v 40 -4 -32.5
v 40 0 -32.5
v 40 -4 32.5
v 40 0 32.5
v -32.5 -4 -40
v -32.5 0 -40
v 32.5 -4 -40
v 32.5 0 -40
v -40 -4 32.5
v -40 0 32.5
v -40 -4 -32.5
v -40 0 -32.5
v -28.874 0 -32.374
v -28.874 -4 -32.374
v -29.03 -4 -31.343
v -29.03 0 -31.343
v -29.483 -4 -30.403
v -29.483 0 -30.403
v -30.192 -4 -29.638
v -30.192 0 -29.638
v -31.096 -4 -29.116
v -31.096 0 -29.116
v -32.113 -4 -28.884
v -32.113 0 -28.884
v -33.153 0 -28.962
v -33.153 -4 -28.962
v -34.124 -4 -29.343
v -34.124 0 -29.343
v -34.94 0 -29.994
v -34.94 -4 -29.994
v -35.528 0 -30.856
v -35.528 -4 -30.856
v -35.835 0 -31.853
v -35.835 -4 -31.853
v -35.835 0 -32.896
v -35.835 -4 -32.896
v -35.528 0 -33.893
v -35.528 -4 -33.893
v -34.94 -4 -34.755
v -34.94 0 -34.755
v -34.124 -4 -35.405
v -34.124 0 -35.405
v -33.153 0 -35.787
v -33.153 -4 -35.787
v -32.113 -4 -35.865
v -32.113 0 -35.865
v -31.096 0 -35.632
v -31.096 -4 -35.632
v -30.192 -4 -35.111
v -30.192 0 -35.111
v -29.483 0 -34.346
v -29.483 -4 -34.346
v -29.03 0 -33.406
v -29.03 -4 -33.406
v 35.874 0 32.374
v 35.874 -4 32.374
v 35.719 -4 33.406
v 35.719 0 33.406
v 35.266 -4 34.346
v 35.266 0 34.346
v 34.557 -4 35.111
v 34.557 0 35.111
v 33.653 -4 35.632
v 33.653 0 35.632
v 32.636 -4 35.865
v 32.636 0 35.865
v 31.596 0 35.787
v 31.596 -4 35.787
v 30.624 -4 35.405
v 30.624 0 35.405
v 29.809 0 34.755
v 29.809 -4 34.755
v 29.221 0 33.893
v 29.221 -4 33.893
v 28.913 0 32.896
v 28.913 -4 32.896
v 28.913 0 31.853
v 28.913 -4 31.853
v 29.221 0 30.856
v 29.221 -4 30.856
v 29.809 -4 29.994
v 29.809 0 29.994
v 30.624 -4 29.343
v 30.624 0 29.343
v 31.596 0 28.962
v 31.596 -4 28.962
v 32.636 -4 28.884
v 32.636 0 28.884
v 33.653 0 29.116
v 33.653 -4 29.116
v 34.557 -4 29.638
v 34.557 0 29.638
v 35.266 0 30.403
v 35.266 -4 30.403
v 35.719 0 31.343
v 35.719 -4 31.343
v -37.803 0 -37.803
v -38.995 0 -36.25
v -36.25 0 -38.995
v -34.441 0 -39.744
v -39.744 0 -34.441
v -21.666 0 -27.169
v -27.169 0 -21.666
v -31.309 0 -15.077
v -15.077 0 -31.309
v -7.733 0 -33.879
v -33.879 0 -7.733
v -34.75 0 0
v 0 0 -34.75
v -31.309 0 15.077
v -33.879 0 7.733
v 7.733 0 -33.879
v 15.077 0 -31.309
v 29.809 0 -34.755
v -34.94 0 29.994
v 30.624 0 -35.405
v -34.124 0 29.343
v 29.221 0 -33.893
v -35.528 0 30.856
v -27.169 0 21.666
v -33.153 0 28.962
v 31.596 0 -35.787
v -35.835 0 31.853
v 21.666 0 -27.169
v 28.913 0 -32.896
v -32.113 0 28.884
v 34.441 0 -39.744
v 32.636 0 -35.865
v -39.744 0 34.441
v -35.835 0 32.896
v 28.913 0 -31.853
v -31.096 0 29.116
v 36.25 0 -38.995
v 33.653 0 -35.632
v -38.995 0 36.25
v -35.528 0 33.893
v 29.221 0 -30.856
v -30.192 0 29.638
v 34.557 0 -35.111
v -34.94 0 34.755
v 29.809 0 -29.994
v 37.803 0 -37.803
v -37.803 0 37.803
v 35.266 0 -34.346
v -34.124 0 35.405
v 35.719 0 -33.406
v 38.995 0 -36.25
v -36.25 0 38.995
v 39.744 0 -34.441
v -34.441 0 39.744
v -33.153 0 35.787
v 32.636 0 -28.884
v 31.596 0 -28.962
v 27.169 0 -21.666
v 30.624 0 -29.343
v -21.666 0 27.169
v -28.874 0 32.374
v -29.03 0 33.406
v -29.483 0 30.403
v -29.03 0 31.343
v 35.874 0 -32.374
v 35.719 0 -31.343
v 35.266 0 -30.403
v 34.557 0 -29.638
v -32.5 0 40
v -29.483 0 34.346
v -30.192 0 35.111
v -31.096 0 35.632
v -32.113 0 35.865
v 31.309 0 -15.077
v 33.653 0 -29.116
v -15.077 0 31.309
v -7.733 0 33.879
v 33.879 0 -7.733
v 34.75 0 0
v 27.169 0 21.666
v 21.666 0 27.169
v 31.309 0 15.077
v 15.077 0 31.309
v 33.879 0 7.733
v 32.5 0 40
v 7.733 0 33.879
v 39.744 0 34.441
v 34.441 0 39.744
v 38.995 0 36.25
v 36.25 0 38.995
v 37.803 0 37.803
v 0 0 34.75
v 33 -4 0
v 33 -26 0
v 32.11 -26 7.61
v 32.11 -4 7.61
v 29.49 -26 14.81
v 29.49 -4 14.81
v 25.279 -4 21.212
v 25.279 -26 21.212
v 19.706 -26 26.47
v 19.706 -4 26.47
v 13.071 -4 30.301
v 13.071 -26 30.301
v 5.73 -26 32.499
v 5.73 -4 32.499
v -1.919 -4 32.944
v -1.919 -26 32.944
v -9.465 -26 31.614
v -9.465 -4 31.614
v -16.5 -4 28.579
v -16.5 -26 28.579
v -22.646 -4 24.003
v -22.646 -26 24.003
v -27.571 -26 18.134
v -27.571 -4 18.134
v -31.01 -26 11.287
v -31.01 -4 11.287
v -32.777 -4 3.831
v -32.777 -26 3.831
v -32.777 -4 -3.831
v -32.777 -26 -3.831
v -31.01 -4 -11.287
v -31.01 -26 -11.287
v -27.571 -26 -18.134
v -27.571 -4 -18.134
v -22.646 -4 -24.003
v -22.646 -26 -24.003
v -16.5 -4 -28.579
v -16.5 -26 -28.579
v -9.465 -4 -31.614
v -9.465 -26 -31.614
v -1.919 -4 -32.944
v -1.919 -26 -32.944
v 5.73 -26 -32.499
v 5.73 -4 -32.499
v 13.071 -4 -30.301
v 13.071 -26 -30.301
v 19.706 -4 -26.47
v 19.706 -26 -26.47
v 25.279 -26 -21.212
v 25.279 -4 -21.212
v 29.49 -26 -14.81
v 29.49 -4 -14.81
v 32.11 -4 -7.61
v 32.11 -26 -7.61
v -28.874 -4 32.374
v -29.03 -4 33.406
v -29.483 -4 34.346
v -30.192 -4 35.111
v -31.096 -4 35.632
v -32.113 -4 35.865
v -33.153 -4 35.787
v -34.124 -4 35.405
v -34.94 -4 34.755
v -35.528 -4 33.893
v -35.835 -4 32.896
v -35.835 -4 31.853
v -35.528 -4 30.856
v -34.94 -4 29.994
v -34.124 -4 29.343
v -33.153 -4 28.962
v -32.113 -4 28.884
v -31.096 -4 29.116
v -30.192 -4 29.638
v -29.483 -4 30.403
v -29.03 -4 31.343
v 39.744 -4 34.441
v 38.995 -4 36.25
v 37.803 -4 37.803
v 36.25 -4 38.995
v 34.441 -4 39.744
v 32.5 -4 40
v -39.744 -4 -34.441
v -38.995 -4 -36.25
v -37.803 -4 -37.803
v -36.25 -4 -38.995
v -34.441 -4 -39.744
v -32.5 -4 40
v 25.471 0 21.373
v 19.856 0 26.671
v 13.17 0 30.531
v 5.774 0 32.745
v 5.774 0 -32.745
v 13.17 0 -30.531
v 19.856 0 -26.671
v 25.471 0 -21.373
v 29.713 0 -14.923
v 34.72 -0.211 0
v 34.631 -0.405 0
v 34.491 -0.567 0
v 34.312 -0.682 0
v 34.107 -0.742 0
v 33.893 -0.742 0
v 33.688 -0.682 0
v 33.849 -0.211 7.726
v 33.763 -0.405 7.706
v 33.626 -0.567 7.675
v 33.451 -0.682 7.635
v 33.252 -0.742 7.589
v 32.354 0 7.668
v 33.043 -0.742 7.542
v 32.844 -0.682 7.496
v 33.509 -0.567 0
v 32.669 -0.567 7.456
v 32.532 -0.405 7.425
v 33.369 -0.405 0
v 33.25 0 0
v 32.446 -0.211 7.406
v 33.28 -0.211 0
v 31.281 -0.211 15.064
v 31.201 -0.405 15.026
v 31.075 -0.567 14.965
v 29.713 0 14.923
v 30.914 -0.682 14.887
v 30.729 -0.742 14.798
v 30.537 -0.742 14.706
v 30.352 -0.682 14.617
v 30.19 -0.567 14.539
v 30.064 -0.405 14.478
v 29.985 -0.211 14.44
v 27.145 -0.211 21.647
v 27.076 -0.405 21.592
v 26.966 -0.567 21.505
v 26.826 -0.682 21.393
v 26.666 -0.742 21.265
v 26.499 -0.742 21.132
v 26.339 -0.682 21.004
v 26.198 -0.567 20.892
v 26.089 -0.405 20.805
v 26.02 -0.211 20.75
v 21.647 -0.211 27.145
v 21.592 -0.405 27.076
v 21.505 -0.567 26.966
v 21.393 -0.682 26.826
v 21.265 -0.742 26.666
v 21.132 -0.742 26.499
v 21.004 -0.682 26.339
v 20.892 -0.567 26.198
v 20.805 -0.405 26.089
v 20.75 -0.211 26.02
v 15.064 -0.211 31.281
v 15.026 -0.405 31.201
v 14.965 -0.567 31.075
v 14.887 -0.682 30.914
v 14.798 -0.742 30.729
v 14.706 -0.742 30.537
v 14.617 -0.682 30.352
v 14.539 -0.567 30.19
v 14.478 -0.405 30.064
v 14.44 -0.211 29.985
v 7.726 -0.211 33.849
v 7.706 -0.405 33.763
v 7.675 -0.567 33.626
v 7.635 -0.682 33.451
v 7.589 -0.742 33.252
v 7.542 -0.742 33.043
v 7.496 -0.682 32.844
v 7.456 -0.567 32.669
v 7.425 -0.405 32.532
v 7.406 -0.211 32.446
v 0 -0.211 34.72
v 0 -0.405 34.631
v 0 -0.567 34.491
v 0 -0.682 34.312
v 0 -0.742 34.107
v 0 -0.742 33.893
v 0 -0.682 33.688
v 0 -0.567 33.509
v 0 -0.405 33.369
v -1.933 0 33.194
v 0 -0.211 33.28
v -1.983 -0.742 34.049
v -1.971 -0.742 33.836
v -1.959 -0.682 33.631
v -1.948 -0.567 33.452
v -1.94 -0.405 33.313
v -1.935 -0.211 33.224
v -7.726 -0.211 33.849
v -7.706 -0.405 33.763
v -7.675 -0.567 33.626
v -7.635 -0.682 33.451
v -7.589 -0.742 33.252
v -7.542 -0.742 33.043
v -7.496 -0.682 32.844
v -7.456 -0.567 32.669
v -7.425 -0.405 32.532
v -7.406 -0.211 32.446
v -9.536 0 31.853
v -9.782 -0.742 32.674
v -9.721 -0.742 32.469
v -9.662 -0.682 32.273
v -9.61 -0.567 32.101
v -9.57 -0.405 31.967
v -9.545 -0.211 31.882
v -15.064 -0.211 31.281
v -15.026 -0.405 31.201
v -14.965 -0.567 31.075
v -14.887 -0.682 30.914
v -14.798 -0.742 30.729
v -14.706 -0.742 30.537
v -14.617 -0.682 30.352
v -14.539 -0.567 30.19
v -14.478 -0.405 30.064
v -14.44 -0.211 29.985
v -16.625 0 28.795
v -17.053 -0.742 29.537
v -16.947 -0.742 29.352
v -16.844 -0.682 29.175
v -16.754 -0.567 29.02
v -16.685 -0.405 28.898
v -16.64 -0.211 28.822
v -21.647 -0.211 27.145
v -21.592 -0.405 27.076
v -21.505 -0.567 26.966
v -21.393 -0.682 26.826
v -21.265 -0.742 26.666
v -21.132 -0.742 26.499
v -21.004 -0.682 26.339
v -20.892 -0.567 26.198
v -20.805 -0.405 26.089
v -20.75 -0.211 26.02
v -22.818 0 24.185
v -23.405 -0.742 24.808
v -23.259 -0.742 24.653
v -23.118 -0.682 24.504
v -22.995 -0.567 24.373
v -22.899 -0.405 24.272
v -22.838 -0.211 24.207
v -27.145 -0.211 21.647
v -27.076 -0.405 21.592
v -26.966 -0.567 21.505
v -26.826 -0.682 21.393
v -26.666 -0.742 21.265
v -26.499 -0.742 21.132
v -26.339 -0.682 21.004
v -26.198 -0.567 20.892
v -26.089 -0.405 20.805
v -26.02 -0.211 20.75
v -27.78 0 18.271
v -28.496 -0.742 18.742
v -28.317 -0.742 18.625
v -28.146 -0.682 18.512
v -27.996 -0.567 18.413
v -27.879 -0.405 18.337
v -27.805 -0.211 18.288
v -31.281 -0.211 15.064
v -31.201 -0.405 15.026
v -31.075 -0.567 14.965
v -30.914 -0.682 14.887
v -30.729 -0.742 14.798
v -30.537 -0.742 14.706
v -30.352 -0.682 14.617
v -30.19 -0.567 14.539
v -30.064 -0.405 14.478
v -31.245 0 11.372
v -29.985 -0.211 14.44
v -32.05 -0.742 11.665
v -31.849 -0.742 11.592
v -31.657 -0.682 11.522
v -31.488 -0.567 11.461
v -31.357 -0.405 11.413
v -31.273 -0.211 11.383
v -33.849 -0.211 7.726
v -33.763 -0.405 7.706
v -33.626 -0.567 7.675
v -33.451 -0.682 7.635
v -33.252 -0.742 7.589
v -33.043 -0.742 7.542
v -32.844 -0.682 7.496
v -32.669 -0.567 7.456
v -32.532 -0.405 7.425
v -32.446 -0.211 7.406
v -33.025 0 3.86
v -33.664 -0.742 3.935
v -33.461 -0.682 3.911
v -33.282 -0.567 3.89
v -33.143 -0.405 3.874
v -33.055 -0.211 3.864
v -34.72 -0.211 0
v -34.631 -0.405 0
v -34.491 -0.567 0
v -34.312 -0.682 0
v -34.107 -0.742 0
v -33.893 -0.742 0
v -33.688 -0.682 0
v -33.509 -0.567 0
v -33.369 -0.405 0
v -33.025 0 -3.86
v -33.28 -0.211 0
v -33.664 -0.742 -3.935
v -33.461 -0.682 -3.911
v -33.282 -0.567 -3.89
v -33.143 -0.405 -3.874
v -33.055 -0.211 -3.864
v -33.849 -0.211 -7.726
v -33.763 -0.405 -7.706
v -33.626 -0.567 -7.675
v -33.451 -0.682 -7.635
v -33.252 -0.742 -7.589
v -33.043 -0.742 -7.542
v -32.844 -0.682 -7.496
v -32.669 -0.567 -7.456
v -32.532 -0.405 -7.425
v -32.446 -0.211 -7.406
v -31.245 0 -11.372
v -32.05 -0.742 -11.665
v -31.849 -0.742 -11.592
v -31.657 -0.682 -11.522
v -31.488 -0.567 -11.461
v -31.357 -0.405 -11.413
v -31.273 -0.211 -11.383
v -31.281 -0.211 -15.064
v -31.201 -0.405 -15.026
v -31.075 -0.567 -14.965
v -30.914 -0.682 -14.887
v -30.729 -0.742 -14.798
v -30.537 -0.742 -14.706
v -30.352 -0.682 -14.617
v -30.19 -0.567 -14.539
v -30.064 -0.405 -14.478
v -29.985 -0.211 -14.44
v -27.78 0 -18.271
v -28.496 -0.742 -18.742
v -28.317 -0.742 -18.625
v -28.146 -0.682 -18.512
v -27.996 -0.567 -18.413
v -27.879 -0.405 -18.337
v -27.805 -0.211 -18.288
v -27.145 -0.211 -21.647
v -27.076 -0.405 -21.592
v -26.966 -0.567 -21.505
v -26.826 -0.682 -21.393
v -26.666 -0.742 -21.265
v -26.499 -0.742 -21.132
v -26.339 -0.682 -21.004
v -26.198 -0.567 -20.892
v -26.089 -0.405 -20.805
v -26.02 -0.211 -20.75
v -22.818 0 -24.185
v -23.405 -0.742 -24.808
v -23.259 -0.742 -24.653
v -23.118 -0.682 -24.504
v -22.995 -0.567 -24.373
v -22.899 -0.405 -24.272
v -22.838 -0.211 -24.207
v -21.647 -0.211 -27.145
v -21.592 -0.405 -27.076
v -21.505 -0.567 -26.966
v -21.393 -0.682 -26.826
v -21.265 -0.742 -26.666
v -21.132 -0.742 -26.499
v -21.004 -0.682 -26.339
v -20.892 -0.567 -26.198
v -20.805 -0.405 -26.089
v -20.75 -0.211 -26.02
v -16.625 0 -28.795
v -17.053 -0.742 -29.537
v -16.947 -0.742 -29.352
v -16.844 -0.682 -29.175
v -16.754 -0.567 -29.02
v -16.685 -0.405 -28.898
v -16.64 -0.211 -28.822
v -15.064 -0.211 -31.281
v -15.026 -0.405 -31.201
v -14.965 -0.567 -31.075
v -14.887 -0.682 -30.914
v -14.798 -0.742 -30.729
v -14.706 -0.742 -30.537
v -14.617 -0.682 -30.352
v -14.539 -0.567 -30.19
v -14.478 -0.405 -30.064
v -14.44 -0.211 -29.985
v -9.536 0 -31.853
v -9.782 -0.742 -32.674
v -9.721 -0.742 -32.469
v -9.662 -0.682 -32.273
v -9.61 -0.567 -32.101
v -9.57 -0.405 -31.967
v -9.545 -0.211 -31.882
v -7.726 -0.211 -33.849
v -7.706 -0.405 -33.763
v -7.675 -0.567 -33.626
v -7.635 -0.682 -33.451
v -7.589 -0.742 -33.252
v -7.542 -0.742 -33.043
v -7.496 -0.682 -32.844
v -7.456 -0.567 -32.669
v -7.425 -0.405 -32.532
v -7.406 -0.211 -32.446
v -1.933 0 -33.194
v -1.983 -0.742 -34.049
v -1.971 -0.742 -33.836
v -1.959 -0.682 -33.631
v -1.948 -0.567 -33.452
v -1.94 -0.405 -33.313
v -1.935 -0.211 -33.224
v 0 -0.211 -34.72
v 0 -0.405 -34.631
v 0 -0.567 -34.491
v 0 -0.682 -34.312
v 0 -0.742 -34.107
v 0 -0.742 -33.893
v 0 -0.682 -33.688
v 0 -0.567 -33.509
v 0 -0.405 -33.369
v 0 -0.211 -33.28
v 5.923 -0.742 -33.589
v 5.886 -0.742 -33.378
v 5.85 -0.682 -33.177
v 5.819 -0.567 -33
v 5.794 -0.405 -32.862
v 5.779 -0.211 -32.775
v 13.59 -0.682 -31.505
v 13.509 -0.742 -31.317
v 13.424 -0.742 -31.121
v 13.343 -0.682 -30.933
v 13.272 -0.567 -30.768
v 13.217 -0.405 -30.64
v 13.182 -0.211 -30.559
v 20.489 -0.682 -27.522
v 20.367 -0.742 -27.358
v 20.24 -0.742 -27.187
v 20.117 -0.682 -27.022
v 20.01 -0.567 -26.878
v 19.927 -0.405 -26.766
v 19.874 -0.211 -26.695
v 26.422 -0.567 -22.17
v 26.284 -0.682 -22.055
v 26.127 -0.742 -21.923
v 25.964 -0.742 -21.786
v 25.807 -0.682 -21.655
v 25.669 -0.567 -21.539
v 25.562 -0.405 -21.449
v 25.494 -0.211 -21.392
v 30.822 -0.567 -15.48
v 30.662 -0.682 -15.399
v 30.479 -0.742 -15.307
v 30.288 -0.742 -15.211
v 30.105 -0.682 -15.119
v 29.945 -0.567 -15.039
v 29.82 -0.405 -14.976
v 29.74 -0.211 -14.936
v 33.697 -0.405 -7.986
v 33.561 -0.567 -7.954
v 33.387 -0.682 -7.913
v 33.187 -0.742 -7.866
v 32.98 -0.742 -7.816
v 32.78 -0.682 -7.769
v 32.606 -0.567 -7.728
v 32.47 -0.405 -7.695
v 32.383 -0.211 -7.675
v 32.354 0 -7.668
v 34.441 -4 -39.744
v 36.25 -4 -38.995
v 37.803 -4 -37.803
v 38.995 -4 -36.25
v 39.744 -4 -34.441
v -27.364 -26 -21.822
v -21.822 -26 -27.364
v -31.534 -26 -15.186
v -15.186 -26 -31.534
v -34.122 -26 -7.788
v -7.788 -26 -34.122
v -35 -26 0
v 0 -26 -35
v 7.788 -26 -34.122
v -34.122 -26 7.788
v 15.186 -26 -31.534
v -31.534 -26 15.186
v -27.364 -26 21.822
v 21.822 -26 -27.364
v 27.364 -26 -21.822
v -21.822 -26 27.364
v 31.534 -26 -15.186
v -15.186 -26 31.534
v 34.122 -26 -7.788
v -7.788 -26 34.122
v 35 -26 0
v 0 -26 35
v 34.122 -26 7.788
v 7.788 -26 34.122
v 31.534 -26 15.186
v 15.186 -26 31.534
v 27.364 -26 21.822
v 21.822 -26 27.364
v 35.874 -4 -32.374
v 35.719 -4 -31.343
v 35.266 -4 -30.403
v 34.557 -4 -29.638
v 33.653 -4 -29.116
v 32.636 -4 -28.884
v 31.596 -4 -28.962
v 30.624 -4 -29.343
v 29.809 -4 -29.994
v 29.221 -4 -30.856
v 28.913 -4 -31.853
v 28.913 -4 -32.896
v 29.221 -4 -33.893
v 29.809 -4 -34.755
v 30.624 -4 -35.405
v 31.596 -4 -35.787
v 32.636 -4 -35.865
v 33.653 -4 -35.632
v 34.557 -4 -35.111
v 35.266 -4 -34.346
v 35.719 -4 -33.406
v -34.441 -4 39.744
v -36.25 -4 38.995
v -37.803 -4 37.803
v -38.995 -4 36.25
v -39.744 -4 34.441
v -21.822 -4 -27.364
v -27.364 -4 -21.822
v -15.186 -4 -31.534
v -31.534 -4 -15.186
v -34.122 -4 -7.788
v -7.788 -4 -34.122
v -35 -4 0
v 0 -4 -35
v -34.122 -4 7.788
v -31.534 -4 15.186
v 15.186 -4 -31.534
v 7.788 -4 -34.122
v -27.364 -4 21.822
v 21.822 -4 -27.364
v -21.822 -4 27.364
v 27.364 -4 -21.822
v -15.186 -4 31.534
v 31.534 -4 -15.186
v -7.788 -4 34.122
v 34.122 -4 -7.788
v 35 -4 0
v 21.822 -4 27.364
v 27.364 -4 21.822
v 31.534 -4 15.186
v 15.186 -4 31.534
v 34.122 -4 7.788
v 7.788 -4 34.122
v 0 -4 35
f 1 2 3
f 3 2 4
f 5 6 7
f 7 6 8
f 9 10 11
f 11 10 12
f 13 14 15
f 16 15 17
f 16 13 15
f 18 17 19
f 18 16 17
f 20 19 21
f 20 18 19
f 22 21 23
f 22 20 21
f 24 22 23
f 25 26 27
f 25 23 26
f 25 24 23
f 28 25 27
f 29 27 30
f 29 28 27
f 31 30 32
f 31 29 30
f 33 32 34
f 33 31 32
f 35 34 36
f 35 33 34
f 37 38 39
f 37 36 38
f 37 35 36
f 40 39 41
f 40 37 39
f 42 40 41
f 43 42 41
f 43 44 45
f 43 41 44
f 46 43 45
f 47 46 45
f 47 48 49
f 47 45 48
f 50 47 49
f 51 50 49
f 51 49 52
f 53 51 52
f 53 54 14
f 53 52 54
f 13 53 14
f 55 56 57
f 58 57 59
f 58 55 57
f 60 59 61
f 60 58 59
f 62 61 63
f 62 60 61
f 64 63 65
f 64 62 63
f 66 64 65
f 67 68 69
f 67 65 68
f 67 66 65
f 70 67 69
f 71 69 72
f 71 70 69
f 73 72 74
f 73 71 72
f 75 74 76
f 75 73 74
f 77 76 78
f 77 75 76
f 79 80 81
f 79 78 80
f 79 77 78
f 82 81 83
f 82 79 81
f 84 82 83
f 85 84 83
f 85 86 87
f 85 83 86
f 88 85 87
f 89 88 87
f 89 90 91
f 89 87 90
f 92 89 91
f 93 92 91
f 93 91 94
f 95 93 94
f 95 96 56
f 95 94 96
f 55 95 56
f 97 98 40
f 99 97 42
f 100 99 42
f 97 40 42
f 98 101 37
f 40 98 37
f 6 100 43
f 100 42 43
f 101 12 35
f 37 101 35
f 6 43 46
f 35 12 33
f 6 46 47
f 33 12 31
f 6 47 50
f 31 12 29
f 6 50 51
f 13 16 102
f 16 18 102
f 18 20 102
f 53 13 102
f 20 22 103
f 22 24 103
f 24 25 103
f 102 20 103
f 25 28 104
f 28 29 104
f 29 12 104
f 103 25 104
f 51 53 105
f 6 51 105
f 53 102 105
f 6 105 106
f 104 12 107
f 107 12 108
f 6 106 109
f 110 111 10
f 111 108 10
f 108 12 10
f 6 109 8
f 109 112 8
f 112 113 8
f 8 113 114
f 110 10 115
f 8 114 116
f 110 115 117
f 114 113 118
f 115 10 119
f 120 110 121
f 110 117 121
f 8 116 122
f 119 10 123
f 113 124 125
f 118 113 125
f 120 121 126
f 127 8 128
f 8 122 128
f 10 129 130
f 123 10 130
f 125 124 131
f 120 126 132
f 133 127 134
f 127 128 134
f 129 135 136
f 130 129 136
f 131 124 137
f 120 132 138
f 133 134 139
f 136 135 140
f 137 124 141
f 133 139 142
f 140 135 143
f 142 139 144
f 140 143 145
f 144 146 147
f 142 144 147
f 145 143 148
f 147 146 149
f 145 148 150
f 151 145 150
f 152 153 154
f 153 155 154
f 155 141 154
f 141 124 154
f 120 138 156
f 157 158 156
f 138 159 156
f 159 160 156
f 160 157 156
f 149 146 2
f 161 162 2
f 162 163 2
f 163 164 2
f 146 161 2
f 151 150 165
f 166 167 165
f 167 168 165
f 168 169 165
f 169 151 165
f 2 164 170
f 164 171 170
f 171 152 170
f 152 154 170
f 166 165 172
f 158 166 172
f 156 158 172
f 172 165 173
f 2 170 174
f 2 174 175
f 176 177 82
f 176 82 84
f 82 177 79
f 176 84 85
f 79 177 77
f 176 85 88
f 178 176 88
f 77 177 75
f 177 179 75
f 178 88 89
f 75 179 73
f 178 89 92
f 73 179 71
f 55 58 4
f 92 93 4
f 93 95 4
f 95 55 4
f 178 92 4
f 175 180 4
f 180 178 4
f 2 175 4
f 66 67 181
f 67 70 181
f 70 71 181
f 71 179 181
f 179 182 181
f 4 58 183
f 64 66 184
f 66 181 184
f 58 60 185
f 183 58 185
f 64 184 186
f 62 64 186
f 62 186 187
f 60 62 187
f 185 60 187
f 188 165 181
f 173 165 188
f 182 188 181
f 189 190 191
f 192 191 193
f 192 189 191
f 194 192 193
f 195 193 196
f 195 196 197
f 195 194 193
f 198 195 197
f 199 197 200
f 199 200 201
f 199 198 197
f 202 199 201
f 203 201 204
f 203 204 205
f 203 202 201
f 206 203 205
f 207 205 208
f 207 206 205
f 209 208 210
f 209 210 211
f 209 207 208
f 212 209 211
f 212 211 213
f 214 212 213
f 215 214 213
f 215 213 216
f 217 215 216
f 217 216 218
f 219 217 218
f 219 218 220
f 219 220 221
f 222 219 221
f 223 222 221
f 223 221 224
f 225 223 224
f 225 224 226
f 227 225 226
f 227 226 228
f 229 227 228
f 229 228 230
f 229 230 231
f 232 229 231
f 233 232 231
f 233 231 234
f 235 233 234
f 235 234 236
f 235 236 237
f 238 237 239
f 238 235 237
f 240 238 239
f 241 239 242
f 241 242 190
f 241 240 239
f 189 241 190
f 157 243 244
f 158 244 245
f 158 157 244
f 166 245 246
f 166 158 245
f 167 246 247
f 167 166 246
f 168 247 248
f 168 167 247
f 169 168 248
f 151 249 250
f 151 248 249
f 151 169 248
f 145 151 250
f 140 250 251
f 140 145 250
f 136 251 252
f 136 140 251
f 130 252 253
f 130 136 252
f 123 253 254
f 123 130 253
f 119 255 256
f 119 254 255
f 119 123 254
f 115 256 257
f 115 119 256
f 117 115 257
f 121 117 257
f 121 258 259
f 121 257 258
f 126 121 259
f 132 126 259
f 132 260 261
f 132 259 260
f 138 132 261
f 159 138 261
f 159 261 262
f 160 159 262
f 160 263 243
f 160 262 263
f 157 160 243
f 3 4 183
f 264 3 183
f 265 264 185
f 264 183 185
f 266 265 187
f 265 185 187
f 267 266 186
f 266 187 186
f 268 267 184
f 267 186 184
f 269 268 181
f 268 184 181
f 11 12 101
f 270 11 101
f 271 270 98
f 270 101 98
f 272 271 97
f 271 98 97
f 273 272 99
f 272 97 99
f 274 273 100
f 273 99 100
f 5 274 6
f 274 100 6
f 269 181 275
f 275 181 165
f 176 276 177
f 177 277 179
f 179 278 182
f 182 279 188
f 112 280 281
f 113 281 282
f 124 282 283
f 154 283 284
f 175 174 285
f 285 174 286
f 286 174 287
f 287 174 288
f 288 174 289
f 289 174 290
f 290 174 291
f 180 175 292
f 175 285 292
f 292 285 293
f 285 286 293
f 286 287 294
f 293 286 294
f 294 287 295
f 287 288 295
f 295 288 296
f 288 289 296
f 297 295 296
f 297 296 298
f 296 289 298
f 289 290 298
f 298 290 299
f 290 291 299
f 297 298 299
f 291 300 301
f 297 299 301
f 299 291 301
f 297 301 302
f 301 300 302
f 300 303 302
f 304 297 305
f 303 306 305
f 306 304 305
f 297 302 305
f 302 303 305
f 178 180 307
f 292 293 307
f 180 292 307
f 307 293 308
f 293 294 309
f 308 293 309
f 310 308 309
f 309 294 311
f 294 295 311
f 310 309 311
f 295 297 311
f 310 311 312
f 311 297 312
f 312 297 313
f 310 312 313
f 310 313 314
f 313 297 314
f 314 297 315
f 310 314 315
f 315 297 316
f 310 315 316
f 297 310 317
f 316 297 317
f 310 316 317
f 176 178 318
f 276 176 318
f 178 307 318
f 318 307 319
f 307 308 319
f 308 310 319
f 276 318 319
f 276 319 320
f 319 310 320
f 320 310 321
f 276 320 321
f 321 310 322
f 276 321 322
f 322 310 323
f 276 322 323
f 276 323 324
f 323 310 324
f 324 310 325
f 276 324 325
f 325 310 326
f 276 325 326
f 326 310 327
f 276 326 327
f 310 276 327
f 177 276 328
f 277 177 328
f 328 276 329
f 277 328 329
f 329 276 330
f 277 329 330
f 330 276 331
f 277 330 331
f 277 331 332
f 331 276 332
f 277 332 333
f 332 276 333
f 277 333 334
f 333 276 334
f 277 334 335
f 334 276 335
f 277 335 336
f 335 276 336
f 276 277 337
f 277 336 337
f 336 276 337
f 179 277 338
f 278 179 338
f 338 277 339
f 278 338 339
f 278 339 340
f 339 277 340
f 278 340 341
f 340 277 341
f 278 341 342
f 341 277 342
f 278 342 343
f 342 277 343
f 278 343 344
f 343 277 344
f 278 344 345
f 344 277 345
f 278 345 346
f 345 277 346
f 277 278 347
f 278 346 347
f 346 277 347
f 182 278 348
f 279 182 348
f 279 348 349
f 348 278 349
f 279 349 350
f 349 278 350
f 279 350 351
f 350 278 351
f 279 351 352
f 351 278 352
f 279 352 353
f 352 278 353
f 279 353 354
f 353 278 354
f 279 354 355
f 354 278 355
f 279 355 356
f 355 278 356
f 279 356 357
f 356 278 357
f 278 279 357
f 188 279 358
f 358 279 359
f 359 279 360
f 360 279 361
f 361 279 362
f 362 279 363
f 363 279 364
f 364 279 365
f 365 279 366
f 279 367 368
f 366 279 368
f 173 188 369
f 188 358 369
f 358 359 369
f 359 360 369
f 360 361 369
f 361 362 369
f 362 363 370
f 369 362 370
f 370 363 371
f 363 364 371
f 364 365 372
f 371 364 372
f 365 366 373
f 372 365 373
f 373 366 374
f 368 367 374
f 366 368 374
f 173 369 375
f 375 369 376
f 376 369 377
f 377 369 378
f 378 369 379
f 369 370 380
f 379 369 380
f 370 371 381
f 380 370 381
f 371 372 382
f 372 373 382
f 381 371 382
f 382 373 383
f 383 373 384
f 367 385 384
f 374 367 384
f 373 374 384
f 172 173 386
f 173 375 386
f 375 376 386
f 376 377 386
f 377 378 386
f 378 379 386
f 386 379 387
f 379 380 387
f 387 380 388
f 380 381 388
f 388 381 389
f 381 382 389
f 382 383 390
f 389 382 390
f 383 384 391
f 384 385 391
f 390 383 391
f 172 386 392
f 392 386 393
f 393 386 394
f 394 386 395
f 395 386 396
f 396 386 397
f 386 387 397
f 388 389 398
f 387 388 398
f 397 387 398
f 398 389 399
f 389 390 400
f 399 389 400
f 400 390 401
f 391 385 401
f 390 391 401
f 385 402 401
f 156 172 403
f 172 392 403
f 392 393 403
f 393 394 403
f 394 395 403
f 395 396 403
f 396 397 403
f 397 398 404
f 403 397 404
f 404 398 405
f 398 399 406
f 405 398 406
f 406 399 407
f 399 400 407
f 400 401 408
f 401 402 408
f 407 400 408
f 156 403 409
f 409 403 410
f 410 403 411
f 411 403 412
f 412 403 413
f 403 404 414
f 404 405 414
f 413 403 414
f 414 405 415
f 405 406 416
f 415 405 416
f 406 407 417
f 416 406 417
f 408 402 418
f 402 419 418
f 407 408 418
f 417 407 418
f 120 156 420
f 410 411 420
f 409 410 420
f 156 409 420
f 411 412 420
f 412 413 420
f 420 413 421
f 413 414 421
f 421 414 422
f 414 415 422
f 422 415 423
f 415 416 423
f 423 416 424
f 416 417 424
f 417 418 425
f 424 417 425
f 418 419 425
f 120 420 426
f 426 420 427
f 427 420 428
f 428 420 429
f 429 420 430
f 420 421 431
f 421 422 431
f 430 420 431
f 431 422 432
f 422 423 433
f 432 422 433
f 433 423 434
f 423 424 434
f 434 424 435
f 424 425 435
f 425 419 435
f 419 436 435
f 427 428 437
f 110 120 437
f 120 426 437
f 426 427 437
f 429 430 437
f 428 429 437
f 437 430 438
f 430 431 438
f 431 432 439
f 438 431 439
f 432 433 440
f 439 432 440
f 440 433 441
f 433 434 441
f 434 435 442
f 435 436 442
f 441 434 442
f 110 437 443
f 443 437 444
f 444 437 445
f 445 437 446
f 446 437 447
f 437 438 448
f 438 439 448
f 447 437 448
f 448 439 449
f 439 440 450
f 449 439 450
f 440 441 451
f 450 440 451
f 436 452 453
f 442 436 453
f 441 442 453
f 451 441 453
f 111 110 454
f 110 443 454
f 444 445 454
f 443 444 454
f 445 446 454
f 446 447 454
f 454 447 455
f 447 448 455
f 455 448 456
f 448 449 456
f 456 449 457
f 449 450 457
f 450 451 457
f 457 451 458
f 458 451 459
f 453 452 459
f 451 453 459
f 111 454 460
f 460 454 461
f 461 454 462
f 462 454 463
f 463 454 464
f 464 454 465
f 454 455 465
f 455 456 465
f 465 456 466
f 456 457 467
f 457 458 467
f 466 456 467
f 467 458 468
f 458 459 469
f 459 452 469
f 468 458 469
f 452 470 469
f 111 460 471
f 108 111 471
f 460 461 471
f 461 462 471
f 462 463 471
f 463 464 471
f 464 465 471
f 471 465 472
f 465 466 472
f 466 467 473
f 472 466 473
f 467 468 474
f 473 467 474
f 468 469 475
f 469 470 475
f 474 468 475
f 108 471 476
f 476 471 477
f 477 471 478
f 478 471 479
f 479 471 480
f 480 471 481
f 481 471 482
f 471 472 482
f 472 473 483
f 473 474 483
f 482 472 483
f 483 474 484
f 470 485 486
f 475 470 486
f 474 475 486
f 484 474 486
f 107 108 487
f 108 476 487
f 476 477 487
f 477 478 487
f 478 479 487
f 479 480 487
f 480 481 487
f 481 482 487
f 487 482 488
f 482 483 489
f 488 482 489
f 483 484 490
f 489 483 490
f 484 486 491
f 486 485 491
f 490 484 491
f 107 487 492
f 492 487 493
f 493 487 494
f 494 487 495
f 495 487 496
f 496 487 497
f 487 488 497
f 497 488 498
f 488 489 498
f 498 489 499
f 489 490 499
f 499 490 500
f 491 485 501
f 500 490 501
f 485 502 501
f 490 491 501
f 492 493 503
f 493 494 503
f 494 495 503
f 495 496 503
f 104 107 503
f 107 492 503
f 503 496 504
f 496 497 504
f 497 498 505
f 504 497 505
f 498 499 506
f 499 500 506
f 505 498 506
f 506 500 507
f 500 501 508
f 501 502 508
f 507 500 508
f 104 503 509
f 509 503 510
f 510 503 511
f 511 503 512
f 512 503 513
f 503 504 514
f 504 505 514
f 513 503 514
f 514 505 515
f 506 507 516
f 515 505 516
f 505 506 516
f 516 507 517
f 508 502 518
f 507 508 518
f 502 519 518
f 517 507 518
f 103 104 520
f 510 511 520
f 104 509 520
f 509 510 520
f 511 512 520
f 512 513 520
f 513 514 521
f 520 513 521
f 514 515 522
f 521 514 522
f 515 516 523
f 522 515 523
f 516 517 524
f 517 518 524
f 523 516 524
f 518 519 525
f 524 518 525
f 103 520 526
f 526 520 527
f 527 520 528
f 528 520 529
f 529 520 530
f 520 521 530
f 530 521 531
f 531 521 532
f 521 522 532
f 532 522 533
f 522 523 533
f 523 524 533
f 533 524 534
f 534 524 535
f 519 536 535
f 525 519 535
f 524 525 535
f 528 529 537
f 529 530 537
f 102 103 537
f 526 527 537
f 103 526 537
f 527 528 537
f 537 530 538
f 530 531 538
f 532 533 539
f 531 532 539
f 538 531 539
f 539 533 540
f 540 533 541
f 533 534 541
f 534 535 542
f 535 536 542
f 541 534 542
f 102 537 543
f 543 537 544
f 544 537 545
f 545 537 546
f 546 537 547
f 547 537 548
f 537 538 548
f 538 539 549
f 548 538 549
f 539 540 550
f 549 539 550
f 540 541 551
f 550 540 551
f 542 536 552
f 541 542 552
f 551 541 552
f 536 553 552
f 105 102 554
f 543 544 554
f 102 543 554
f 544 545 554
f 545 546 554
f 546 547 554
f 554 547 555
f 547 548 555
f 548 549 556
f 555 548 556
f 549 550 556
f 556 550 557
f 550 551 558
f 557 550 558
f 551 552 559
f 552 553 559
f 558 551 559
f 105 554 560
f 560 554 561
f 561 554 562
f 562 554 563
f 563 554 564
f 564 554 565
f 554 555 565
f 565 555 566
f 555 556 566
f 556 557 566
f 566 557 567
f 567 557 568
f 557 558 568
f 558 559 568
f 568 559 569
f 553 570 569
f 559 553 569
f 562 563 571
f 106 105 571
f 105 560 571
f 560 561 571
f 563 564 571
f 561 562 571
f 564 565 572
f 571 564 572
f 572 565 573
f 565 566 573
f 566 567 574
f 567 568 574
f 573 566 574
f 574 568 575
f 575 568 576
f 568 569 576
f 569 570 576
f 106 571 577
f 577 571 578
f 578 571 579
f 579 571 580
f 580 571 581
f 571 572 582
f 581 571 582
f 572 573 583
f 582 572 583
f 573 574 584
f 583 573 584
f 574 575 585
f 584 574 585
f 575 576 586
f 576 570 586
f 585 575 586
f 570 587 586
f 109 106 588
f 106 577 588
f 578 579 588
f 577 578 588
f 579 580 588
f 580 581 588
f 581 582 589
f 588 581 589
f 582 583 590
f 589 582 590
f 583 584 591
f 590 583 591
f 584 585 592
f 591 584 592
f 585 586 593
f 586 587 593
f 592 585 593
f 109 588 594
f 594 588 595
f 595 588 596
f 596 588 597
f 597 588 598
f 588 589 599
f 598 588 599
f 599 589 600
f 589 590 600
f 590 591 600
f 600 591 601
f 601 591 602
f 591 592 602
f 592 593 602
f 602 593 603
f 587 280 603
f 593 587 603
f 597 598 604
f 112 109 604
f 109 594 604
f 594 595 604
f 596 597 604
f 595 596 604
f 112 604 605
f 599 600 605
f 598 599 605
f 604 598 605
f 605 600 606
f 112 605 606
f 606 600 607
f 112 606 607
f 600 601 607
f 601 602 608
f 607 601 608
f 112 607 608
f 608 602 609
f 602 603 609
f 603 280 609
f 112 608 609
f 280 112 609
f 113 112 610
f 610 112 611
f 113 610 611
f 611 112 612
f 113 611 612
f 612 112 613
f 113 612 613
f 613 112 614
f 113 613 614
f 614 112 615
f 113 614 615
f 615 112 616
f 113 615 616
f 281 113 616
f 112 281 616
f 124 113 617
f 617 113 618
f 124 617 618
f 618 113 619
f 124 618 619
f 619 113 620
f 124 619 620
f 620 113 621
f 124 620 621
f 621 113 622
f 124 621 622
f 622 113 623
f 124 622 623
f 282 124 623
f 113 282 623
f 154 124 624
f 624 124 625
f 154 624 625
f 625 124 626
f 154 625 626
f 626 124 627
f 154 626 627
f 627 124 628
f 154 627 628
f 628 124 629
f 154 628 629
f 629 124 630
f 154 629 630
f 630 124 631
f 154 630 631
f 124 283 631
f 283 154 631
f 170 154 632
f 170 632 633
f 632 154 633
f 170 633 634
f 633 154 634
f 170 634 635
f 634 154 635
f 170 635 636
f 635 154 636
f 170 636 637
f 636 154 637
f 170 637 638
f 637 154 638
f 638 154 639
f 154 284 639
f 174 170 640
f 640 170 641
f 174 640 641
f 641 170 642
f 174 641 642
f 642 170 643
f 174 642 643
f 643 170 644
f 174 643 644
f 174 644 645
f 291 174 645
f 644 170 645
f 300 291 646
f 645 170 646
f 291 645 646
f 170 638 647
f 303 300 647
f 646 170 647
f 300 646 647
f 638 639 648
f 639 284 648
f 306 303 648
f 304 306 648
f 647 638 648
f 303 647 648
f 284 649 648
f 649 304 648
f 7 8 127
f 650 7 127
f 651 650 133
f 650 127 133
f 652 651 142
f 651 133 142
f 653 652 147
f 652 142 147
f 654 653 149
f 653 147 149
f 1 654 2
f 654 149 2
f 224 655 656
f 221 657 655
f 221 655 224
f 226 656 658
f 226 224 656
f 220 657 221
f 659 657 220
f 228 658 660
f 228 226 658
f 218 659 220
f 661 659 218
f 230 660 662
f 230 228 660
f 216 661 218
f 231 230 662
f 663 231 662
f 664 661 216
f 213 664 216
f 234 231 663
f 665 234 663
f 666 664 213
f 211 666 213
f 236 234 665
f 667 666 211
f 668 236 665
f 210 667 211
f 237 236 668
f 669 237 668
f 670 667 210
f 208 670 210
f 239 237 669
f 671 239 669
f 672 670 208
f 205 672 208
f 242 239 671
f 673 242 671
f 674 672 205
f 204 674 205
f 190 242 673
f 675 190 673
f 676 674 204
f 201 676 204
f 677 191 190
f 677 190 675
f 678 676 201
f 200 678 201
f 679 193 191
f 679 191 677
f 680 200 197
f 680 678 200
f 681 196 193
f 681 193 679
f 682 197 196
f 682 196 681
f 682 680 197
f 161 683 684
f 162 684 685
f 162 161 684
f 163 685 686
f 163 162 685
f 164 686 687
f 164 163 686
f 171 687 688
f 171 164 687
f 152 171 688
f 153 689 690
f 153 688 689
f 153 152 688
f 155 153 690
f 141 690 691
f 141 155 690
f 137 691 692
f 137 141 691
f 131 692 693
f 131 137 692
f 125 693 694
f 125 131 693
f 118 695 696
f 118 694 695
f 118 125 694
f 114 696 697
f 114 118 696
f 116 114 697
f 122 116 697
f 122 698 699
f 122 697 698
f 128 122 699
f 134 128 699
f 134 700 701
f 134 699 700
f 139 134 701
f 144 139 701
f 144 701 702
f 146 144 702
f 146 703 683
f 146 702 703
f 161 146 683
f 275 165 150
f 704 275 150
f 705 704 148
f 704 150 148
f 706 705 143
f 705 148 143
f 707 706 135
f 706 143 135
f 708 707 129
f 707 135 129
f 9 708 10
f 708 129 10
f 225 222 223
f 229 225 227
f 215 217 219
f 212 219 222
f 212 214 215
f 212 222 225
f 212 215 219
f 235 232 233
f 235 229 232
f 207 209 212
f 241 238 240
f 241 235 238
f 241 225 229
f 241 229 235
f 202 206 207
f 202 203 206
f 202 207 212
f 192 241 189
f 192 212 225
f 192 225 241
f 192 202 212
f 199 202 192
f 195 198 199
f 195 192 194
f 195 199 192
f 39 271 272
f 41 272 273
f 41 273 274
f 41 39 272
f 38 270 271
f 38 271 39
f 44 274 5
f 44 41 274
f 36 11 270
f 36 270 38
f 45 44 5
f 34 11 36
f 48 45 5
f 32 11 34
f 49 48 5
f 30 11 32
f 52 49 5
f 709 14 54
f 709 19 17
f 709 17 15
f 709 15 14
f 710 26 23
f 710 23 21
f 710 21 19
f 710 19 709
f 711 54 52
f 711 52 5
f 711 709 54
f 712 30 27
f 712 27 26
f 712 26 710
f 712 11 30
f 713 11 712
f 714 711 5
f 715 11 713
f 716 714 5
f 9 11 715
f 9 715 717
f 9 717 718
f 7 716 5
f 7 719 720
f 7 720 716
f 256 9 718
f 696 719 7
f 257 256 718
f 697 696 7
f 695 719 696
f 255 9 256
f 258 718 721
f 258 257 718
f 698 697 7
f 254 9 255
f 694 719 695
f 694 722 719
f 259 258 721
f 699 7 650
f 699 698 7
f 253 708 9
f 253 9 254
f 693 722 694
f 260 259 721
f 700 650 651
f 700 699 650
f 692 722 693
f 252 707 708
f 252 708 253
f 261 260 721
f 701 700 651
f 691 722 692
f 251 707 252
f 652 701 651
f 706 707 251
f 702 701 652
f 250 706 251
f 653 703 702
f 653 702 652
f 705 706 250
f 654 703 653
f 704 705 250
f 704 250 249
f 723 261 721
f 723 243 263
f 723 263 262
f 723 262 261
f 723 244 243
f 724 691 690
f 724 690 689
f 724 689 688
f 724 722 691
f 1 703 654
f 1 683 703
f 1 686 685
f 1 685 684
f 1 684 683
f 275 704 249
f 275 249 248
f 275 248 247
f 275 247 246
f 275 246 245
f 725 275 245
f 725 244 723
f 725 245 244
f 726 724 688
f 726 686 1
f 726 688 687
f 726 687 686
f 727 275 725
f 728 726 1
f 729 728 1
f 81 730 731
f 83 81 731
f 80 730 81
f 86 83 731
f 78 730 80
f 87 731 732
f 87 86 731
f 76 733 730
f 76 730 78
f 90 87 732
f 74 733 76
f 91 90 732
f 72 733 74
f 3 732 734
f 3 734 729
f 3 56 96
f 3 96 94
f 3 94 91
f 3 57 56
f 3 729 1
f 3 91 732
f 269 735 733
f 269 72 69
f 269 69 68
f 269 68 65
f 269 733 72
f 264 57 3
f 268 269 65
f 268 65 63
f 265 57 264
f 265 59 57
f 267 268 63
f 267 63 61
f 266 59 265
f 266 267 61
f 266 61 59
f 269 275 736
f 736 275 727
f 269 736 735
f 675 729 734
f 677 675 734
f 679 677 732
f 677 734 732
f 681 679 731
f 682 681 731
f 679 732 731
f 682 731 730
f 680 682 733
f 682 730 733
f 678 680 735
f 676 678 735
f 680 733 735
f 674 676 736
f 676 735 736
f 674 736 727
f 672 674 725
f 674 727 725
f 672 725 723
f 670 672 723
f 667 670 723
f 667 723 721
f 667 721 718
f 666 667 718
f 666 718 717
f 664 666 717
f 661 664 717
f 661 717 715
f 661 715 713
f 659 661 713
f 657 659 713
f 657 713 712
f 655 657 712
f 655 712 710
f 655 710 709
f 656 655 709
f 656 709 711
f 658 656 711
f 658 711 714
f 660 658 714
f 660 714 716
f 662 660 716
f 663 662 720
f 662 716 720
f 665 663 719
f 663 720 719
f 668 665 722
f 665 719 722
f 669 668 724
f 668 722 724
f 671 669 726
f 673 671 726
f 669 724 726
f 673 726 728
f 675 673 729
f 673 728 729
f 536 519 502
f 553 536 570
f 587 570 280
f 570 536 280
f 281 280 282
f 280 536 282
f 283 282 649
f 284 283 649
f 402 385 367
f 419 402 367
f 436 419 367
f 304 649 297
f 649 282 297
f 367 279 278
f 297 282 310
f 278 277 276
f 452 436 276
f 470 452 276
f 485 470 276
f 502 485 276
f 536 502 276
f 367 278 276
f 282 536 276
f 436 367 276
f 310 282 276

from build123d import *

# Parameters (mm, degrees)
F3_DEPTH = 4
F1_R     = 35
F1_R_2   = 33
F4_DEPTH = 26
F2_R     = 3.5
F5_DEPTH = 26.001
F6_R     = 33
F7_DEPTH = 22
F8_R     = 0.75


with BuildPart() as f3:
    # F0 (on Front) → F3 (new body)
    with BuildSketch(Plane.XZ):
        with BuildLine():
            Line((32.5, 40), (-32.5, 40))
            ThreePointArc((-32.5, 40), (-37.803301, 37.803301), (-40, 32.5))
            Line((-40, 32.5), (-40, -32.5))
            ThreePointArc((-40, -32.5), (-37.803301, -37.803301), (-32.5, -40))
            Line((-32.5, -40), (32.5, -40))
            ThreePointArc((32.5, -40), (37.803301, -37.803301), (40, -32.5))
            Line((40, -32.5), (40, 32.5))
            ThreePointArc((40, 32.5), (37.803301, 37.803301), (32.5, 40))
        make_face()
    extrude(amount=F3_DEPTH)

    # F1 (on face) → F4 (join)
    with BuildSketch(Plane.XZ):
        Circle(F1_R)
        Circle(F1_R_2, mode=Mode.SUBTRACT)
    extrude(amount=F4_DEPTH)

    # F2 (on face) → F5 (cut, through all)
    with BuildSketch(Plane.XZ):
        with Locations((-32.374369, 32.374369)):
            Circle(F2_R)
        with Locations((-32.374369, -32.374369)):
            Circle(F2_R)
        with Locations((32.374369, -32.374369)):
            Circle(F2_R)
        with Locations((32.374369, 32.374369)):
            Circle(F2_R)
    extrude(amount=F5_DEPTH, mode=Mode.SUBTRACT)

    # F6 (on face) → F7 (cut)
    with BuildSketch(Plane.XZ.offset(26)):
        Circle(F6_R)
    extrude(amount=-F7_DEPTH, mode=Mode.SUBTRACT)

    # F9: sweep along a path in F1
    with BuildLine(Plane.XZ) as f9_path:
        CenterArc((0, 0), 33, 0, 360)
    # F8 (on Right) → F9 (sweep, cut)
    with BuildSketch(Plane.YZ):
        with Locations((0, 34)):
            Circle(F8_R)
    sweep(path=f9_path.line, mode=Mode.SUBTRACT)


solid = f3.part
